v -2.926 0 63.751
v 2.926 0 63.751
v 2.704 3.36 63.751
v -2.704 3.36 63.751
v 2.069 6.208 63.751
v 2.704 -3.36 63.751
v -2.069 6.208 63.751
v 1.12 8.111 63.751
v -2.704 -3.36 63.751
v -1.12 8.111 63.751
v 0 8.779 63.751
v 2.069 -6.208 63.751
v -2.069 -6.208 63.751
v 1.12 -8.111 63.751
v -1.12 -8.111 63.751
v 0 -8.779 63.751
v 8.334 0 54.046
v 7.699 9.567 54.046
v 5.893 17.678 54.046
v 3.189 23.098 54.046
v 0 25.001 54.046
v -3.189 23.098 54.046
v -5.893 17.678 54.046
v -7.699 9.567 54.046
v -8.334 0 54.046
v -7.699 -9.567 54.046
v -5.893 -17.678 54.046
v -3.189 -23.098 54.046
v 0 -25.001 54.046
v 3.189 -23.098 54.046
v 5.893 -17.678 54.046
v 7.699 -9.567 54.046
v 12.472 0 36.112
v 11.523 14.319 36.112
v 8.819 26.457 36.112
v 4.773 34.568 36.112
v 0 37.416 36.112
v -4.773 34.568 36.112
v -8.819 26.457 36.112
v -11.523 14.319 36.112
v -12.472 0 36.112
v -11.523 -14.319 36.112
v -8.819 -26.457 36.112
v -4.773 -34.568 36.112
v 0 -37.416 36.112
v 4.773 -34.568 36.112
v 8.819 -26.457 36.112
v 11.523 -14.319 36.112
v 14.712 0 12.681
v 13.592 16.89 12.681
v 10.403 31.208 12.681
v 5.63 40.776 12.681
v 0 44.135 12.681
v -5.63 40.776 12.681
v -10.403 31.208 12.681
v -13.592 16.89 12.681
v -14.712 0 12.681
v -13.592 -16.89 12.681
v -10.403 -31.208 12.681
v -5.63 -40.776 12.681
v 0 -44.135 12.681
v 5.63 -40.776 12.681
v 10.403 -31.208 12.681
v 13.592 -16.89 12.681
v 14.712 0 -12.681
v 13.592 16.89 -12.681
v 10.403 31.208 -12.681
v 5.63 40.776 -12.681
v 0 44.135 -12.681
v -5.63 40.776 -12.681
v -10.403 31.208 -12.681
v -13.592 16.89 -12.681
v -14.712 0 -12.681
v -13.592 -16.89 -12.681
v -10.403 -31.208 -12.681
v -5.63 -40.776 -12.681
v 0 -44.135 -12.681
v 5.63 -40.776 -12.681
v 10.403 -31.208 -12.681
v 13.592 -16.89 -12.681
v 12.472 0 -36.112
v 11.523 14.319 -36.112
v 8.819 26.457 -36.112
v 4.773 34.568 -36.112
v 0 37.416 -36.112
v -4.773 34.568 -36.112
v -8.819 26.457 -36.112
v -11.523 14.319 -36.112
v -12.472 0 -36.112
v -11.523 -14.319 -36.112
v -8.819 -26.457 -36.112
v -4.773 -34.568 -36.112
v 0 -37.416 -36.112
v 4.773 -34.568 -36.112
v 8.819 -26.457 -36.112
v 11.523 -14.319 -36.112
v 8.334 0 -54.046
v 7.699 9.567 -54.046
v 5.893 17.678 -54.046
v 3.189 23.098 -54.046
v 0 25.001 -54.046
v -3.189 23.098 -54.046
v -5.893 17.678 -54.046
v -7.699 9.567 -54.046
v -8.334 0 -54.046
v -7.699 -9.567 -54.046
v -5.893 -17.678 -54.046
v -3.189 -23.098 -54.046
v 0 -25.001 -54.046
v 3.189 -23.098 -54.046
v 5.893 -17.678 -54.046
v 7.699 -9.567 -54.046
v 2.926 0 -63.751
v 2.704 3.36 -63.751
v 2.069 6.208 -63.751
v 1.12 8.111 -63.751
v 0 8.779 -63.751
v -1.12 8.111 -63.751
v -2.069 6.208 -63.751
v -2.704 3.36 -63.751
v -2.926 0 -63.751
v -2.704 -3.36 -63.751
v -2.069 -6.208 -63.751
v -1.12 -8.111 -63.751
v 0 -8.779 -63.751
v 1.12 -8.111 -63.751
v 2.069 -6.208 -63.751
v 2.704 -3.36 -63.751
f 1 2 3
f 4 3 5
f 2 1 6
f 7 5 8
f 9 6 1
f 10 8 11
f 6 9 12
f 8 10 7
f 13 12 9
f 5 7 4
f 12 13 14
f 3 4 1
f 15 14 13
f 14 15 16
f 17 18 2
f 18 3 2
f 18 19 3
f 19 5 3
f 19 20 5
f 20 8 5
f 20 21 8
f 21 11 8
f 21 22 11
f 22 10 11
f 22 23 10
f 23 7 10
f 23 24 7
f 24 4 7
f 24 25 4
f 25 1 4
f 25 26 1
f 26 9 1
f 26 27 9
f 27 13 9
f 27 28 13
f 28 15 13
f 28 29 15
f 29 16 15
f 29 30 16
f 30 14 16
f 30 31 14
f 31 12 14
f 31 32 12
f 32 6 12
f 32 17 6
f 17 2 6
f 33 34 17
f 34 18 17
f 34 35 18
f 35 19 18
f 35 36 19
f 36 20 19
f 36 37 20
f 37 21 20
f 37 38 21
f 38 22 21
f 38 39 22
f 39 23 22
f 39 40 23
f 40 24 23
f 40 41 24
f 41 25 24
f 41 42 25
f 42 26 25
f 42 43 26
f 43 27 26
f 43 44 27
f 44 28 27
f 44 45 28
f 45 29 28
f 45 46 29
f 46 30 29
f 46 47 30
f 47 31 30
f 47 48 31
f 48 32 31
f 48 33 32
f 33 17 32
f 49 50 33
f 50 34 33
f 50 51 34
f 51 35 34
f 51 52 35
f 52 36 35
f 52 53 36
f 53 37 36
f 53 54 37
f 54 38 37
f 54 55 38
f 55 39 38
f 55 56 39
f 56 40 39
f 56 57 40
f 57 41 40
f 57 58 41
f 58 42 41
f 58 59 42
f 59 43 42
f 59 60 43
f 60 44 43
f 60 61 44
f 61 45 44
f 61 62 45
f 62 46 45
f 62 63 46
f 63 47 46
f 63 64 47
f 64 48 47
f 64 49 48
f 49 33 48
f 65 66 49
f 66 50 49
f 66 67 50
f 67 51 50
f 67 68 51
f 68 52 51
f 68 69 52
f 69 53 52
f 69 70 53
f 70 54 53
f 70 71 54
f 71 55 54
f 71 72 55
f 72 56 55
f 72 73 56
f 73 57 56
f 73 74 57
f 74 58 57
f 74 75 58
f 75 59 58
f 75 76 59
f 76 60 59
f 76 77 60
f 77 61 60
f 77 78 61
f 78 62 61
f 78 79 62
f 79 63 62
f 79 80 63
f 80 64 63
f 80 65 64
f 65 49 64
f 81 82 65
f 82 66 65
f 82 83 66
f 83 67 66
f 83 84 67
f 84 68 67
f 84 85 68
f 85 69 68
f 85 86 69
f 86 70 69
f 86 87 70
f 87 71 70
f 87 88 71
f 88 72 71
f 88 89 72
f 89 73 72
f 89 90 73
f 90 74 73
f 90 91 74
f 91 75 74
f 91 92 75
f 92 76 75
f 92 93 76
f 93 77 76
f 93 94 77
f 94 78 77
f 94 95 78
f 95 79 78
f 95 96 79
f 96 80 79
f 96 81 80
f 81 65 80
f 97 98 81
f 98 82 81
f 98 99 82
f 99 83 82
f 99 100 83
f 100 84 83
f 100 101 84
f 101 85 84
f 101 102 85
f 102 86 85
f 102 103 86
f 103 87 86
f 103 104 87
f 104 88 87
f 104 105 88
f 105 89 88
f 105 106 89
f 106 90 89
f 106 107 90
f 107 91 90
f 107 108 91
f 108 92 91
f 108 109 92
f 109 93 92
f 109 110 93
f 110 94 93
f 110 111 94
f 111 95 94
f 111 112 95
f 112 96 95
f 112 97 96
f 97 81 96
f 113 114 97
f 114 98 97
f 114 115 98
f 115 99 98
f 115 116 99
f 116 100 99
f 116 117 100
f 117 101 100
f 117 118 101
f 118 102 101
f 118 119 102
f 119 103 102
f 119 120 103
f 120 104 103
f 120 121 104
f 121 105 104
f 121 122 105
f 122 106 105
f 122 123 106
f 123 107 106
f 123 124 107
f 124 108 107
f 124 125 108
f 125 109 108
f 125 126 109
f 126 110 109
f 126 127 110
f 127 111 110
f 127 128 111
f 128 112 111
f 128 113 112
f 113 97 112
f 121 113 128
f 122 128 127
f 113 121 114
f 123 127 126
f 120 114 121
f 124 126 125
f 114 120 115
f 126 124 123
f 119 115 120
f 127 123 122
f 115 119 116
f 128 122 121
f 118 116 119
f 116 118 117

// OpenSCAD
// Generated by SolidPython 1.0.1 on 2020-07-29 00:46:45


scale(v = [3, 9, 13]) {
	sphere(r = 5);
}
/***********************************************
*********      SolidPython code:      **********
************************************************
 
# import packages: SolidPython
from solid import *
from solid.utils import *
from itertools import chain, combinations, permutations


class Resize:

    def __init__(self, scad_file):
        self.scad_file = scad_file
        #self.scad_file = import_scad(scad_file)
        # cone/cylinder param:
        self.r1 = 0
        self.r2 = 0
        self.h = 0
        # rectangular prism param:
        self.w = 0
        self.l = 0
        # ellipse param:
        self.r = 0

    # import OpenScad code (file name corresponds to shape)


    # classify shape + parameters
    def assign(self, param1, param2, param3):
        if self.scad_file == 'cone.scad':
            self.r1 = param1
            self.r2 = param2
            self.h = param3
        elif self.scad_file == 'cylinder.scad':
            self.r1 = param1
            self.r2 = param2
            self.h = param3
        elif self.scad_file == 'rectangularPrism.scad':
            self.h = param1
            self.l = param2
            self.w = param3
        else:
            self.r = param1
            self.h = param2

    # resize parameters
    def iterate(self):
        x = range(3, 20, 2)
        i = 1
        if self.scad_file == 'cone.scad':
            tempList = list(permutations(x, 2))
            for temp in tempList:
                param1 = temp[0]
                param2 = temp[1]
                filepath = 'produced_scad_files/' + 'cone' + str(param1) + '_' + str(param2) + '_' + '.scad'
                scad_render_to_file(cylinder(h=param1, r1=param2, r2=0), filepath)

        elif self.scad_file == 'cylinder.scad':
            tempList = list(permutations(x, 3))
            for temp in tempList:
                param1 = temp[0]
                param2 = temp[1]
                filepath = 'produced_scad_files/' + 'cylinder' + str(param1) + '_' + str(param2) + '_' + '.scad'
                scad_render_to_file(cylinder(h=param1, r1=param2, r2=param2), filepath)

        elif self.scad_file == 'rectangularPrism.scad':
            tempList = list(permutations(x, 3))
            for temp in tempList:
                param1 = temp[0]
                param2 = temp[1]
                param3 = temp[2]
                filepath = 'produced_scad_files/' + 'rectangularPrism' + str(param1) + '_' + str(param2) + '_' + str(
                    param3) + '.scad'
                scad_render_to_file(cube(size=(param1, param2, param3)), filepath)

        elif self.scad_file == 'ellipse.scad':
            tempList = list(permutations(x, 4))
            for temp in tempList:
                param1 = temp[0]
                param2 = temp[1]
                param3 = temp[2]
                param4 = temp[3]
                filepath = 'produced_scad_files/' + 'ellipse' + str(param1) + '_' + str(param2) + '_' + str(param3) + '_' + str(param4) + '.scad'
                scad_render_to_file(scale([param1, param2, param3])(sphere(r=param4)), filepath)

    def render_to_scadfile(self):
        scad_render_to_file(scad, 'example.scad') 
 
************************************************/
